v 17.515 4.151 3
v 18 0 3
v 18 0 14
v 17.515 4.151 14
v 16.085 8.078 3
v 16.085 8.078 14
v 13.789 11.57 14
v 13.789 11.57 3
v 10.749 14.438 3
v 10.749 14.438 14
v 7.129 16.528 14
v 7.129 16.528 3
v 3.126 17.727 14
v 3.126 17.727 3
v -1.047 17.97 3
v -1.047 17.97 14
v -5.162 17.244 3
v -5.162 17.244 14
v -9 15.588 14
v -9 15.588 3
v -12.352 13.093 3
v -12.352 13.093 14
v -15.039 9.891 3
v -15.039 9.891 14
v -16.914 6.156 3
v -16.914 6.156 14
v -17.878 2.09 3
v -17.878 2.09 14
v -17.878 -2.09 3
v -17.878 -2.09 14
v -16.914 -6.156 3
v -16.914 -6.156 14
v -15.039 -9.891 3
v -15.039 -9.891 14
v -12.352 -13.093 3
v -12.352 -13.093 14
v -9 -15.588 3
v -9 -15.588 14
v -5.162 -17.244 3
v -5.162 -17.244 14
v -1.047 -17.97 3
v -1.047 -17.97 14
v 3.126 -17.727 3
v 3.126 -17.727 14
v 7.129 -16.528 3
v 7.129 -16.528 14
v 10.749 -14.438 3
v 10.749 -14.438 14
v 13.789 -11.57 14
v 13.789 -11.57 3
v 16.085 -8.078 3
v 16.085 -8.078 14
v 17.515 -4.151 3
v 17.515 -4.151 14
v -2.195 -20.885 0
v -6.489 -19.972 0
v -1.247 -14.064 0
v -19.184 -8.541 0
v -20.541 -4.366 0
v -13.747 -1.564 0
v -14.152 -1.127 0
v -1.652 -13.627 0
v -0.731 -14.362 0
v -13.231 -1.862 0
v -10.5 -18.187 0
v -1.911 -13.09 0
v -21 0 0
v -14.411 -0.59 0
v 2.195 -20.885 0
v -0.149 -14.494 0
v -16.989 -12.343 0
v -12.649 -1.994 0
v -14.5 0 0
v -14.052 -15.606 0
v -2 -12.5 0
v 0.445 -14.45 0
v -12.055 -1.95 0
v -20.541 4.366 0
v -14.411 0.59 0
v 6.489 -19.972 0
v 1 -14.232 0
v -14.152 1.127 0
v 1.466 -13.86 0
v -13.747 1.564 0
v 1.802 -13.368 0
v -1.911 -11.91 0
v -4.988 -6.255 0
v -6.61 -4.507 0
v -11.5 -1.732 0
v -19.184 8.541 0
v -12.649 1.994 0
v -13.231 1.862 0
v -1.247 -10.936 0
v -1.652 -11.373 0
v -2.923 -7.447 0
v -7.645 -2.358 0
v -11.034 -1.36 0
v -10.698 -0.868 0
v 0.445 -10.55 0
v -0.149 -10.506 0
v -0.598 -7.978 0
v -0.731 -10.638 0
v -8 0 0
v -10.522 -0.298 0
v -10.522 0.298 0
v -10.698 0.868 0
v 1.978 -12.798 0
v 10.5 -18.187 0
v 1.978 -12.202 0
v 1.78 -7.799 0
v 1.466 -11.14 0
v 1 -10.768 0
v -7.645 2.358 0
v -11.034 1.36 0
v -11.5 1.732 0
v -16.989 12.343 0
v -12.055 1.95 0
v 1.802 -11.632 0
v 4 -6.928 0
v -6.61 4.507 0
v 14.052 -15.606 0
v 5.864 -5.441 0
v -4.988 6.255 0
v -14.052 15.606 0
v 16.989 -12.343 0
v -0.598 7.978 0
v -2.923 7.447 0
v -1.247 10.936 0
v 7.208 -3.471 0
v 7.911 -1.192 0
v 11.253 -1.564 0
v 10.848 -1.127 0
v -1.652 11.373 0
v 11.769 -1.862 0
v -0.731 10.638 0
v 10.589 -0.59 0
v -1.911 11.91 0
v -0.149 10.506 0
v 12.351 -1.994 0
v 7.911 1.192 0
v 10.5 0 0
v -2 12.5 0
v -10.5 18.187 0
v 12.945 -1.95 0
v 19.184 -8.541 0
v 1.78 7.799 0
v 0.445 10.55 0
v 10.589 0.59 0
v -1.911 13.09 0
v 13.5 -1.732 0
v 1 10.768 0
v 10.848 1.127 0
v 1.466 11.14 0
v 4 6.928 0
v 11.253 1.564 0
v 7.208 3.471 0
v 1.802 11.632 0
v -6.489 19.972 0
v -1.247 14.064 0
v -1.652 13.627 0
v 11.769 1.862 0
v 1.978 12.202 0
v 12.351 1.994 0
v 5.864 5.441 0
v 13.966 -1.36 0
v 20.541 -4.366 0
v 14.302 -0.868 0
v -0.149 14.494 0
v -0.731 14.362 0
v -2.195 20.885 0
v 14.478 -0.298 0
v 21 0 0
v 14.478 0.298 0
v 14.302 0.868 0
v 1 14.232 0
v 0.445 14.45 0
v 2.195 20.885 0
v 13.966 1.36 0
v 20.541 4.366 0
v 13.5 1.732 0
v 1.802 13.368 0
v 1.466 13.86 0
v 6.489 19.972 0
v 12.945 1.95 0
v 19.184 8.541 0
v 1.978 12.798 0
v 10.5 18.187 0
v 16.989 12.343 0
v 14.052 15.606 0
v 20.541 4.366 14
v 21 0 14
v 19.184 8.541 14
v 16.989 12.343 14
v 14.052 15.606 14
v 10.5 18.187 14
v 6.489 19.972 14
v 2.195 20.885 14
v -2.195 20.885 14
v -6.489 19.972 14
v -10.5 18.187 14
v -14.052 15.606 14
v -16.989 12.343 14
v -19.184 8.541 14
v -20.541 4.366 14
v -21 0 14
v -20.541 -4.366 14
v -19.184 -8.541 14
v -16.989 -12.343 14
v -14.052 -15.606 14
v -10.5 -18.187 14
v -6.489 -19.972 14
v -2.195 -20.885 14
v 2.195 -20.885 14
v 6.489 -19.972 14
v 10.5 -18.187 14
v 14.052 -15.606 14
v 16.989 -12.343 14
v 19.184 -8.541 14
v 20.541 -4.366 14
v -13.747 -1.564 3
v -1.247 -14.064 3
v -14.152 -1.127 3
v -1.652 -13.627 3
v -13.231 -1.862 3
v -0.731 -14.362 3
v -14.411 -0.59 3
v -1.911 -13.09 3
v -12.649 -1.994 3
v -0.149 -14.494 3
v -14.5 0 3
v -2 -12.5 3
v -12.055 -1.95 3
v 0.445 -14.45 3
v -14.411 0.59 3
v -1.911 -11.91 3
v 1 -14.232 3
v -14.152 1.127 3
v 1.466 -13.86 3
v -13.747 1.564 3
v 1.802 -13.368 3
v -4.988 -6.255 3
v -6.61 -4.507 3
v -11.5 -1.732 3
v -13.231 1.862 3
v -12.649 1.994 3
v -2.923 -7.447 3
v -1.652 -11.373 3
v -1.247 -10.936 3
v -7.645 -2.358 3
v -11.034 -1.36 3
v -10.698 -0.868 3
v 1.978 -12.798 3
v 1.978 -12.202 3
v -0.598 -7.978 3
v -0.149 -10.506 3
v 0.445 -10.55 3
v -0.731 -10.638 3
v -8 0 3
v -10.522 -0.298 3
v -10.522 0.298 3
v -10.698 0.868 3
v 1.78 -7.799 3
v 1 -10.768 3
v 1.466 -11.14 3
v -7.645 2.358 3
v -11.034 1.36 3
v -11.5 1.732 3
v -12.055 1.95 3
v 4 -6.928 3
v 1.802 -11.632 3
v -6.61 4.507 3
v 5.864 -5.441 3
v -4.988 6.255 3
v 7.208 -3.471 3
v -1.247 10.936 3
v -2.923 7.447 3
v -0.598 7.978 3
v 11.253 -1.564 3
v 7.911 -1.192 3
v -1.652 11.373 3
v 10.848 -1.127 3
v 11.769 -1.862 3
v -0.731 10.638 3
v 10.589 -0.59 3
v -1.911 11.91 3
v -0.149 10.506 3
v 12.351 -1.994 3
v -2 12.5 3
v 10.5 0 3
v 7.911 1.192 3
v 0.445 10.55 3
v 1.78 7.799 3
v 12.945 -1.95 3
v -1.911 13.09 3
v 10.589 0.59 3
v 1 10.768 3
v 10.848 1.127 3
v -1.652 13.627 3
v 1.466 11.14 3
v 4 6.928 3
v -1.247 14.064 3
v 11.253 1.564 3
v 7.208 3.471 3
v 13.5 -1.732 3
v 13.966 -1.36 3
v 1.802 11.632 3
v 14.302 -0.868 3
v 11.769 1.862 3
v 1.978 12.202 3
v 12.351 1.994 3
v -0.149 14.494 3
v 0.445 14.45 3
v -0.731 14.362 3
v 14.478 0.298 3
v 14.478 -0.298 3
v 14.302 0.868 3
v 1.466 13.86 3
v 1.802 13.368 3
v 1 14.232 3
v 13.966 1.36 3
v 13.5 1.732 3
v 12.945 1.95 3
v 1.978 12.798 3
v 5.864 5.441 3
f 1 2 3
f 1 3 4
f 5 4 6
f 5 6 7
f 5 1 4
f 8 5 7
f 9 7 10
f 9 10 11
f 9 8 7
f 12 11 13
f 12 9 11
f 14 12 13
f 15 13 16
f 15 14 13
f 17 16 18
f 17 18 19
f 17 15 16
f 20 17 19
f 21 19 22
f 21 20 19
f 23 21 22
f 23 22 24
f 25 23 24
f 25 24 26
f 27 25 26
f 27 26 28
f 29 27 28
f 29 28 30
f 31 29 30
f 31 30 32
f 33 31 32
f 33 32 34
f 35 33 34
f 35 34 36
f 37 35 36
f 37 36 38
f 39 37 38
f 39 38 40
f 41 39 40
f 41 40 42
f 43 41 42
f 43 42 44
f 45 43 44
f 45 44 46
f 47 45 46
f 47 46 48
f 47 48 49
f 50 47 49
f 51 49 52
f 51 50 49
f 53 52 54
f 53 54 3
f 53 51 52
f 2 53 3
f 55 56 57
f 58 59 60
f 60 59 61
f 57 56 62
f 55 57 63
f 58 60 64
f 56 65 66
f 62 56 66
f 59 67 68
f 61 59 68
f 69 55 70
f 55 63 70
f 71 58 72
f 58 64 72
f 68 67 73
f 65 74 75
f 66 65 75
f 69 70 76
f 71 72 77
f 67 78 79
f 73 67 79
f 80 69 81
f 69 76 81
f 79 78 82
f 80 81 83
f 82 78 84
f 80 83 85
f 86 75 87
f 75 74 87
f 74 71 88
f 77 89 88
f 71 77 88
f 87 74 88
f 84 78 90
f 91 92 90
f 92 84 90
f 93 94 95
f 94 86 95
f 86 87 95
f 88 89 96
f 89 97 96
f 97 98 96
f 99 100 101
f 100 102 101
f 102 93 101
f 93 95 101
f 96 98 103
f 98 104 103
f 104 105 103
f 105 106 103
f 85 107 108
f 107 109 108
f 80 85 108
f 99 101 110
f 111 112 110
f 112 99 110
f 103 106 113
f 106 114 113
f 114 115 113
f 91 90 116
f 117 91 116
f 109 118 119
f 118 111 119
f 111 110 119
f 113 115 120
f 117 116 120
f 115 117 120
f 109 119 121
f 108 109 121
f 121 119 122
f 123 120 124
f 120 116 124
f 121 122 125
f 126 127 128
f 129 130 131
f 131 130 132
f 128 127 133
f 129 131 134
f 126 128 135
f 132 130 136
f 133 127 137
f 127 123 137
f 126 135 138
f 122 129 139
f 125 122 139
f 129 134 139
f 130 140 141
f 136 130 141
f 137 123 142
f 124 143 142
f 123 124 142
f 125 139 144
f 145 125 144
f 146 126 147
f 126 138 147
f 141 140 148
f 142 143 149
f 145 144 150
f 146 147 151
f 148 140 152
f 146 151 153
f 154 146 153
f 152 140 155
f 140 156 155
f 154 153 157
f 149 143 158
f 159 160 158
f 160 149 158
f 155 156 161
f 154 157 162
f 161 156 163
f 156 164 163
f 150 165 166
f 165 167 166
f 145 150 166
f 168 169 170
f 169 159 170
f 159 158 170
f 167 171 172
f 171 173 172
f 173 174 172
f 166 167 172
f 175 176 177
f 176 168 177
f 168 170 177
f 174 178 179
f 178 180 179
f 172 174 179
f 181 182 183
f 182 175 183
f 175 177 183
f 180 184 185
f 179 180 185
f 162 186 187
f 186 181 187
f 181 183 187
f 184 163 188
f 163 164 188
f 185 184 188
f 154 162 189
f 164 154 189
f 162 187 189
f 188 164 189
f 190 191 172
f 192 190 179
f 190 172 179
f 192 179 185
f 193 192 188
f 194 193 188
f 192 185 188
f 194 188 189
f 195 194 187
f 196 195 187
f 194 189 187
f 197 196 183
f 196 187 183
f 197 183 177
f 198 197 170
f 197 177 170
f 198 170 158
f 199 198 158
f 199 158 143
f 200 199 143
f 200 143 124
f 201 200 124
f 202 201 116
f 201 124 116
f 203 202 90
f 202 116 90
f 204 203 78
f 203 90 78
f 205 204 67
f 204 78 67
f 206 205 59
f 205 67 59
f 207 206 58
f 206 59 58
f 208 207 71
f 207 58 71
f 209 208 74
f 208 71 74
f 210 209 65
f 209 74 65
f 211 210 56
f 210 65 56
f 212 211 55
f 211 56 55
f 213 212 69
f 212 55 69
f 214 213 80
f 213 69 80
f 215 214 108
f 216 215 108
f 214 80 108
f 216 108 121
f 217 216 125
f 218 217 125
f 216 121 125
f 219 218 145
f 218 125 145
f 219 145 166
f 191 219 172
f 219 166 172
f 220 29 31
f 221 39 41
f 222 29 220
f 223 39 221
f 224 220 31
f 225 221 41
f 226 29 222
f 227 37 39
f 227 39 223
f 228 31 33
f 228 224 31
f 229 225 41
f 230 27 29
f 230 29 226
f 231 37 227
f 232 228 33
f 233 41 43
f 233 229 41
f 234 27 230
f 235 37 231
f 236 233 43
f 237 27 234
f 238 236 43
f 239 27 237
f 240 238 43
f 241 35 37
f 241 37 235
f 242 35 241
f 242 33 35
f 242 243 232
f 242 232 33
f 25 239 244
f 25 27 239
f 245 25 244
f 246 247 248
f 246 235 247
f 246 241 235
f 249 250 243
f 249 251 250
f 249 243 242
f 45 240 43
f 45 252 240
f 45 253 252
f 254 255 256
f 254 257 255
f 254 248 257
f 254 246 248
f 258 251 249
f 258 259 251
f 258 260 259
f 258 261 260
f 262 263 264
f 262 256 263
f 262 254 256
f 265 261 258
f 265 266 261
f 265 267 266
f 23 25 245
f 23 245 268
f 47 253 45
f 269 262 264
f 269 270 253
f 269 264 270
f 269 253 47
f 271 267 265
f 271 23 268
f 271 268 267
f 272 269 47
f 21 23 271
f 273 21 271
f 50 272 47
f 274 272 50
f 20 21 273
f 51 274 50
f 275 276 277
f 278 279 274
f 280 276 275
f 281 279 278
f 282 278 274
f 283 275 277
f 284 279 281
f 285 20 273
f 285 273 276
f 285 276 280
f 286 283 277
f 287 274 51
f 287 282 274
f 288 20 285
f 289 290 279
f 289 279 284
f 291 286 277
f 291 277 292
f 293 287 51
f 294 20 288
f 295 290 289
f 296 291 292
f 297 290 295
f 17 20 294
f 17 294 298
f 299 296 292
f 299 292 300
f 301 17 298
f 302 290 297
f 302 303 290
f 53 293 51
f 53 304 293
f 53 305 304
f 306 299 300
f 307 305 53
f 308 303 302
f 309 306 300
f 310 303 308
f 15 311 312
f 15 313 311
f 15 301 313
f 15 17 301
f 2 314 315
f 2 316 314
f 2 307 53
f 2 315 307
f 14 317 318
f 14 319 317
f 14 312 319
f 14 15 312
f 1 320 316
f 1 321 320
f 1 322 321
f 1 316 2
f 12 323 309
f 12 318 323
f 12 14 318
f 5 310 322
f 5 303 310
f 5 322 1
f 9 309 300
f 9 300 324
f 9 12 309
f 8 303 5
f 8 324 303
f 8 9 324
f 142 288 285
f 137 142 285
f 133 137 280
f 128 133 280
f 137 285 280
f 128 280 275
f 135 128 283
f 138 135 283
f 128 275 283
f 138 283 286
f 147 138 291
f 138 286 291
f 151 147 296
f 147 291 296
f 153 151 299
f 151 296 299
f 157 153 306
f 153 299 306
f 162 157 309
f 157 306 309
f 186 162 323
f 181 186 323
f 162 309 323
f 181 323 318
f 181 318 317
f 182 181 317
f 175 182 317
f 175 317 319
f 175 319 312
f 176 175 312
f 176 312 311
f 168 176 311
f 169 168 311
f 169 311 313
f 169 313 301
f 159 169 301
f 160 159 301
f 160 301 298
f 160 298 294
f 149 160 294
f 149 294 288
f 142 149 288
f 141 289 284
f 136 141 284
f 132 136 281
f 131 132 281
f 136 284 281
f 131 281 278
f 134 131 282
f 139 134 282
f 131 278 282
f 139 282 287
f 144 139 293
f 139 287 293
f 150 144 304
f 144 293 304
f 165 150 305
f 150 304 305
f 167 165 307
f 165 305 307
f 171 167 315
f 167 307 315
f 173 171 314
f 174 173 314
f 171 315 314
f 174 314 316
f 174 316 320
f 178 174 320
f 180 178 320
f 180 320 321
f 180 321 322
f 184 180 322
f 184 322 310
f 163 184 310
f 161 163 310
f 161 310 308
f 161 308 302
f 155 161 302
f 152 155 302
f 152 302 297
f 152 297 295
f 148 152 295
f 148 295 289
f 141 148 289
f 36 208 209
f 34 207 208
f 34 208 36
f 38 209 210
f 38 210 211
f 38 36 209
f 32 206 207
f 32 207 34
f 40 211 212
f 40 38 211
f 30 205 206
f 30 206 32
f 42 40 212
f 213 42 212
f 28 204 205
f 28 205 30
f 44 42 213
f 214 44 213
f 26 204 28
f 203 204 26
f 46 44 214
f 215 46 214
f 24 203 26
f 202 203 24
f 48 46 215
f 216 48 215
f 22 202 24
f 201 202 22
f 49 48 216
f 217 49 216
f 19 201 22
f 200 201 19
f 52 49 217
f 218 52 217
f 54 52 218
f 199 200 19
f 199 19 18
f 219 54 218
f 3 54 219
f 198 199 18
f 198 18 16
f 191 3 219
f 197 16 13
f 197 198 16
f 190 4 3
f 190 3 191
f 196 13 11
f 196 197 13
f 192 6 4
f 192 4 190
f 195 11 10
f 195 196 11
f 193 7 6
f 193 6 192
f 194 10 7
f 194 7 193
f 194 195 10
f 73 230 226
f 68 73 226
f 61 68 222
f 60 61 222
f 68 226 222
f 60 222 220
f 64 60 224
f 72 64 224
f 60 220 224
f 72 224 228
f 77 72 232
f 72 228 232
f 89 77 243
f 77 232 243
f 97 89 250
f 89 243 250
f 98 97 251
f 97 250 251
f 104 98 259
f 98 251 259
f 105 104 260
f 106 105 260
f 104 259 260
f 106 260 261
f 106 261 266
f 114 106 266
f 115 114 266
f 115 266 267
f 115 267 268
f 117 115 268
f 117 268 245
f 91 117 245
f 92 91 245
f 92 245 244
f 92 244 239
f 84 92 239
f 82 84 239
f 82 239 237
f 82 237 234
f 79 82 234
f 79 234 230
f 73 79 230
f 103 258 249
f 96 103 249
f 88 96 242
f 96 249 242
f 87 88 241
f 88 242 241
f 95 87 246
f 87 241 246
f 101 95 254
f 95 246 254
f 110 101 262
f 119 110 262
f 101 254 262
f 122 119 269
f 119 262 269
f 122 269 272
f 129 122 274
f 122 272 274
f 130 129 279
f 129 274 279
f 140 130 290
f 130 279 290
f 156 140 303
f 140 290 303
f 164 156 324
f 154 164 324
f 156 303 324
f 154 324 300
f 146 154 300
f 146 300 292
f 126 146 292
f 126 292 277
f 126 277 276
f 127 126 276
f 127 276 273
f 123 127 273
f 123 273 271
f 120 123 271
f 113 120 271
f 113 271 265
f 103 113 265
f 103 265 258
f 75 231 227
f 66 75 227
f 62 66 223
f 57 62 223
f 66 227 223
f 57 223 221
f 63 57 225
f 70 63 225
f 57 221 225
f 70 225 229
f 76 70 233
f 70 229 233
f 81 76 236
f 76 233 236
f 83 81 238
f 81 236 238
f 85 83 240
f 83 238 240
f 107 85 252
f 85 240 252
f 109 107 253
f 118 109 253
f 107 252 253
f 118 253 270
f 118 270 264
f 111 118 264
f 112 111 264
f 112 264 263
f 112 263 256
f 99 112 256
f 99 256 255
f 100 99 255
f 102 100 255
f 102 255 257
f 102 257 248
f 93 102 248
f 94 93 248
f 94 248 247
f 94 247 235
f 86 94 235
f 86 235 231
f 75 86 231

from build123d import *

# Parameters (mm, degrees)
F2_R     = 21
F3_DEPTH = 14
F4_T     = -3
F6_D     = 4
F7_D     = 16


with BuildPart() as f3:
    # F2 (on Top) → F3 (new body)
    with BuildSketch(Plane.XY):
        Circle(F2_R)
    extrude(amount=F3_DEPTH)

    # F4
    f4_openings = [f3.faces().sort_by_distance(p)[0] for p in [
        (0, 0, 14),
    ]]
    offset(amount=F4_T, openings=f4_openings)

    # F6 (through all)
    with Locations(Plane(origin=(0, 0, 0), x_dir=(1, 0, 0), z_dir=(0, 0, -1))):
        with Locations((-12.5, 0), (0, 12.5), (12.5, 0), (0, -12.5)):
            Hole(F6_D / 2)

    # F7 (through all)
    with Locations(Plane(origin=(0, 0, 0), x_dir=(1, 0, 0), z_dir=(0, 0, -1))):
        with Locations((0, 0)):
            Hole(F7_D / 2)


solid = f3.part
